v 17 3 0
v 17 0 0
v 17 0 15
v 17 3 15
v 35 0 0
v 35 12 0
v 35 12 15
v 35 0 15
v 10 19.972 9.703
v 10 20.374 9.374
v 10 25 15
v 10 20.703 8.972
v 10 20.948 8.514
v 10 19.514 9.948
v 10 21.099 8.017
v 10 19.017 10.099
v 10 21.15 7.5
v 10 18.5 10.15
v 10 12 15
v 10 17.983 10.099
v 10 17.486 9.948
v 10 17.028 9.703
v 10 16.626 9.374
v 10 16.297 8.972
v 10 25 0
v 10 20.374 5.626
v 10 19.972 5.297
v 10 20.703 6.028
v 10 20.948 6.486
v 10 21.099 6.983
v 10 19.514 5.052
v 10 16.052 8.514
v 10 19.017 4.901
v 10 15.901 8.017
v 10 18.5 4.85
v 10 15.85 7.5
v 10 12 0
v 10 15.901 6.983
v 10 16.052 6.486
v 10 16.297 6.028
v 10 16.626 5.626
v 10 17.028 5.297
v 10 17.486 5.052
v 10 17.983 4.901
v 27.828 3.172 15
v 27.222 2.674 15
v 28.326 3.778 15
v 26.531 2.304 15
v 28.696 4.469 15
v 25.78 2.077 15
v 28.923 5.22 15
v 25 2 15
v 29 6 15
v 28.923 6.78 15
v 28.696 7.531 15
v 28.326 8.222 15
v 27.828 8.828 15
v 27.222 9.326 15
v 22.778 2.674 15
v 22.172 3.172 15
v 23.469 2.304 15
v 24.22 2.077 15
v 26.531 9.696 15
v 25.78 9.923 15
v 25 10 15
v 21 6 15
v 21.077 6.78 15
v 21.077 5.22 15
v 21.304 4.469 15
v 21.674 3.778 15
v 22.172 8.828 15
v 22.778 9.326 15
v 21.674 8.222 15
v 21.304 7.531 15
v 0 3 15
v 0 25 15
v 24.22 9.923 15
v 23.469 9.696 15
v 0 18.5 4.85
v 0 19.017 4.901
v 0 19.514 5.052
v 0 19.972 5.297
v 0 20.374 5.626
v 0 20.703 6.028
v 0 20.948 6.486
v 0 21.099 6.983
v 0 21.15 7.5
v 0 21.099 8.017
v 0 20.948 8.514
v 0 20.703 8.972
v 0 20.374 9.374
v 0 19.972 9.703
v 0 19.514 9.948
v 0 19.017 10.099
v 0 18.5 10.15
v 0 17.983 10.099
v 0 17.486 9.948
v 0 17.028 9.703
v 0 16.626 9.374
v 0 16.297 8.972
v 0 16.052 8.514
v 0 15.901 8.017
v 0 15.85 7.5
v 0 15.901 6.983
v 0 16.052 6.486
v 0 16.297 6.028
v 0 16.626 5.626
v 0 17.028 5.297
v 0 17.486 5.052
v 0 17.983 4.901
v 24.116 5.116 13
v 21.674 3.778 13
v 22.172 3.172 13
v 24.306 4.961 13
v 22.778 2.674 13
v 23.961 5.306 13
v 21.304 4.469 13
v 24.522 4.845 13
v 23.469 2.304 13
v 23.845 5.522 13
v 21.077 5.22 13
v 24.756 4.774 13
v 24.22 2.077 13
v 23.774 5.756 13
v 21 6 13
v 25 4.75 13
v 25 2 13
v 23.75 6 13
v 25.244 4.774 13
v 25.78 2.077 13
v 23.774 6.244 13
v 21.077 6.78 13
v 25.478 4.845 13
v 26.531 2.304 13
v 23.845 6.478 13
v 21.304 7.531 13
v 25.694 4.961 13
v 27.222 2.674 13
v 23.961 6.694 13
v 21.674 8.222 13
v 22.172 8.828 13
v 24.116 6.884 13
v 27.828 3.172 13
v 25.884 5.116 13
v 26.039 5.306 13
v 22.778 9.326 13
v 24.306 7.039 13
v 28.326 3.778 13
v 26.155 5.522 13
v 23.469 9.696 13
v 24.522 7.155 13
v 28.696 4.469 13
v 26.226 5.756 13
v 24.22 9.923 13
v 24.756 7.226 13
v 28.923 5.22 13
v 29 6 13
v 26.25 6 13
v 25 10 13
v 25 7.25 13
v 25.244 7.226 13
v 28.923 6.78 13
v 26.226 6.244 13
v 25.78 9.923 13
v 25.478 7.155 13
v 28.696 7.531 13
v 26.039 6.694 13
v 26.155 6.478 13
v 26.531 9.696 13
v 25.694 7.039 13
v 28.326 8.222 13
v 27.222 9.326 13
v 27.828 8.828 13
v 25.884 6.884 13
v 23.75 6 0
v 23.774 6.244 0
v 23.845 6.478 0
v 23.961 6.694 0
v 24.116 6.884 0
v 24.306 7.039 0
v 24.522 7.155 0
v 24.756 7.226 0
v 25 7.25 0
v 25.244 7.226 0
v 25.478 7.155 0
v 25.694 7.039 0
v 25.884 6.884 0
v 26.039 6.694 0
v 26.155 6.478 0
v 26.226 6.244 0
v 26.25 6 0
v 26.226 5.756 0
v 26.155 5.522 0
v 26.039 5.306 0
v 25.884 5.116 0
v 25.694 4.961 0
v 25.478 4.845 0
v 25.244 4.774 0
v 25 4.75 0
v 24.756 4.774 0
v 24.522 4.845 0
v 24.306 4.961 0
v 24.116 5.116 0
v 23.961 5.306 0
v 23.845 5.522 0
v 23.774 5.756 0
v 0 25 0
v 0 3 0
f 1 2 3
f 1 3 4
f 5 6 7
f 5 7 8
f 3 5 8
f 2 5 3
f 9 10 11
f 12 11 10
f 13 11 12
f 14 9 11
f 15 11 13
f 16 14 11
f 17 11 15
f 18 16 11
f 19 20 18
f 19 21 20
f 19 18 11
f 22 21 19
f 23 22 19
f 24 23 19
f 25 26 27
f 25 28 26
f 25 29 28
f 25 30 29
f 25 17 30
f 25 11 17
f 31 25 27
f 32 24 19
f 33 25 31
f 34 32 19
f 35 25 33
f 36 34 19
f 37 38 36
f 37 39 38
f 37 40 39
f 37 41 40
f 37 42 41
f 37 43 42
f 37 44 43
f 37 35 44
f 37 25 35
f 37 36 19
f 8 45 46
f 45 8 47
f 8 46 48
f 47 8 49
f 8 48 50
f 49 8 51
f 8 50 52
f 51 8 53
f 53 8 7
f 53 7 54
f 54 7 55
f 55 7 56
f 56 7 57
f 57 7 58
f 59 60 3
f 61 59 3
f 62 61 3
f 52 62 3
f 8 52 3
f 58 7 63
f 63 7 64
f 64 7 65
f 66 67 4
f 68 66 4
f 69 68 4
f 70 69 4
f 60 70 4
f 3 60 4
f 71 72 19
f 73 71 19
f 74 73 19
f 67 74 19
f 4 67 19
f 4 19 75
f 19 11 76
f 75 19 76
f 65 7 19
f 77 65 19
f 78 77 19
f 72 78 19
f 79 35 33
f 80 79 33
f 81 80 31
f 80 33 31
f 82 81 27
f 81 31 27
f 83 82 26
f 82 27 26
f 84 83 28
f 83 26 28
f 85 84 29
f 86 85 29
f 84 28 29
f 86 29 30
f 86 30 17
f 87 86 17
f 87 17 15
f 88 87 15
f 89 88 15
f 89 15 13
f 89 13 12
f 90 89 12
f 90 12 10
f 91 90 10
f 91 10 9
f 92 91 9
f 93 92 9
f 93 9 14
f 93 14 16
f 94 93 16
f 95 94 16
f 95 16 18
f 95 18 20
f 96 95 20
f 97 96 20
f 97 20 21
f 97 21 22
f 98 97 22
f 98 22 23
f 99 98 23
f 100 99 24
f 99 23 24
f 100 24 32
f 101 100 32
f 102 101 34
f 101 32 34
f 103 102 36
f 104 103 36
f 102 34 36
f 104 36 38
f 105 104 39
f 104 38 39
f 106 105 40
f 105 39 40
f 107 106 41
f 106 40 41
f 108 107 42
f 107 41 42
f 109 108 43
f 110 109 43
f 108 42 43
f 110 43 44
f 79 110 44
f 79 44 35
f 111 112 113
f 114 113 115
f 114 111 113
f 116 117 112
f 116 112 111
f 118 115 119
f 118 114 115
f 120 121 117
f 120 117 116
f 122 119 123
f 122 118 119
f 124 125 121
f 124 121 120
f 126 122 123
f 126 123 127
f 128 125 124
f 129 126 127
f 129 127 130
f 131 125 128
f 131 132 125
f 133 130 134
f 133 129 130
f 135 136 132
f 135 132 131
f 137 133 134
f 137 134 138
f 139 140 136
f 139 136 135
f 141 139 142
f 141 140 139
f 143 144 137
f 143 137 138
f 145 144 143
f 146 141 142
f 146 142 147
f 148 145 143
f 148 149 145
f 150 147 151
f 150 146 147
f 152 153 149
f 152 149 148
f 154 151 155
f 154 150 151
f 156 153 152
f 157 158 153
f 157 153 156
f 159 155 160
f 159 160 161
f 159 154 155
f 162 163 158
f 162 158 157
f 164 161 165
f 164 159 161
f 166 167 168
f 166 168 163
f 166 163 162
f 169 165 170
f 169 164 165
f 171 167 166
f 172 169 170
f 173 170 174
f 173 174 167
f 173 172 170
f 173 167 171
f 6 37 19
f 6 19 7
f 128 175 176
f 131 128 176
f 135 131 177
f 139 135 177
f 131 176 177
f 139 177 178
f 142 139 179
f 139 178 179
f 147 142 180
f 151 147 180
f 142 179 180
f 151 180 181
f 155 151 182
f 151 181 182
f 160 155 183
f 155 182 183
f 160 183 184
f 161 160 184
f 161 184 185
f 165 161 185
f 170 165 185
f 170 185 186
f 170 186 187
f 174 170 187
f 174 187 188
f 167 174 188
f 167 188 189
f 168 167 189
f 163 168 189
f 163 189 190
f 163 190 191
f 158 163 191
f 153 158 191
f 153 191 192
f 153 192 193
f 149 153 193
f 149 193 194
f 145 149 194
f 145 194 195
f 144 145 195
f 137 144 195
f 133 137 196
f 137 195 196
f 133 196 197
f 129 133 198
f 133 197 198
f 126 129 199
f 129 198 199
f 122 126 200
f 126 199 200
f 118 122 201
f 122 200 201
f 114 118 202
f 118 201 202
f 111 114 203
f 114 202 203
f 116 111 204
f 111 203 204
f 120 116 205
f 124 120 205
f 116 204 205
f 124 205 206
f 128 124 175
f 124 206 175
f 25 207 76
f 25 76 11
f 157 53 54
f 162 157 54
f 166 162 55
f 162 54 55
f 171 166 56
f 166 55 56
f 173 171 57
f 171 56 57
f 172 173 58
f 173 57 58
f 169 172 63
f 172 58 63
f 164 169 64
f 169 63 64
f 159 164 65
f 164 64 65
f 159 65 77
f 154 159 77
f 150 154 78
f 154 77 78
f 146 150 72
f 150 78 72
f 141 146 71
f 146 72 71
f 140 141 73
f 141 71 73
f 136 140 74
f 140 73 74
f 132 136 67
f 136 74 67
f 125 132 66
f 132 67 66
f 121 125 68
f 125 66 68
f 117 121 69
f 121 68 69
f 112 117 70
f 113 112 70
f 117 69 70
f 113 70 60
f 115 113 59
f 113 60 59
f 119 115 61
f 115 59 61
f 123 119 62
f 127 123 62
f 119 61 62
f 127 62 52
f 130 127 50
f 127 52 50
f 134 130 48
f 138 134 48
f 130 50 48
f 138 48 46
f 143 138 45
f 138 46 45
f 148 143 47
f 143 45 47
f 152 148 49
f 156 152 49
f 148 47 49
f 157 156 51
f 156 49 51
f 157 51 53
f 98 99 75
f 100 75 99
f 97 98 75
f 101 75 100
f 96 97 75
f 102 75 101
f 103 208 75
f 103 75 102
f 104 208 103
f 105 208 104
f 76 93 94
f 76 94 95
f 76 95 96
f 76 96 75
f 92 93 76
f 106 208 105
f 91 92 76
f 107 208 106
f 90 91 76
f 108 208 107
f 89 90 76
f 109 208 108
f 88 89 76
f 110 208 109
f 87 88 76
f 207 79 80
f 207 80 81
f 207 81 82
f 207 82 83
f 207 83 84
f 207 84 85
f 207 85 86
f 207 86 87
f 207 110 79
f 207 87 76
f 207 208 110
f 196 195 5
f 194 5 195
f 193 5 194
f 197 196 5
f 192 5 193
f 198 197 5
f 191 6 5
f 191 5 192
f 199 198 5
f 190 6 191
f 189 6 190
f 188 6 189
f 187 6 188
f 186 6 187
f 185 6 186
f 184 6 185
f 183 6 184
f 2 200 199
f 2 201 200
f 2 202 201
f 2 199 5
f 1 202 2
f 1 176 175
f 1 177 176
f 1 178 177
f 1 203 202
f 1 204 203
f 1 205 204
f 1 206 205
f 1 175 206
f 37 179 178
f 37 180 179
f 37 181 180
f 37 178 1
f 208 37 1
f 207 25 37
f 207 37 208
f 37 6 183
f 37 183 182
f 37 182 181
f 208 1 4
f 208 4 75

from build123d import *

# Parameters (mm, degrees)
BOSS_EXTRUDE1_DEPTH = 15
SKETCH3_R           = 2.65
CUT_EXTRUDE1_DEPTH  = 15
M3_TAPPED_HOLE1_D   = 2.5
SKETCH7_R           = 4
CUT_EXTRUDE2_DEPTH  = 2


with BuildPart() as part:
    # Sketch1 → Boss-Extrude1 (new body)
    with BuildSketch(Plane.XY):
        Polygon((35, 0), (17, 0), (17, 3), (0, 3), (0, 25), (10, 25), (10, 12), (35, 12), align=None)
    extrude(amount=BOSS_EXTRUDE1_DEPTH)

    # Sketch3 → Cut-Extrude1 (cut)
    with BuildSketch(Plane(origin=(10, 0, 0), x_dir=(0, 0, -1), z_dir=(1, 0, 0))):
        with Locations((-7.5, 18.5)):
            Circle(SKETCH3_R)
    extrude(amount=-CUT_EXTRUDE1_DEPTH, mode=Mode.SUBTRACT)

    # M3 Tapped Hole1 (through all)
    with Locations(Plane(origin=(25, 6, 15), x_dir=(1, 0, 0), z_dir=(0, 0, 1))):
        with Locations((0, 0)):
            Hole(M3_TAPPED_HOLE1_D / 2)

    # Sketch7 → Cut-Extrude2 (cut)
    with BuildSketch(Plane.XY.offset(15)):
        with Locations((25, 6)):
            Circle(SKETCH7_R)
    extrude(amount=-CUT_EXTRUDE2_DEPTH, mode=Mode.SUBTRACT)


solid = part.part
